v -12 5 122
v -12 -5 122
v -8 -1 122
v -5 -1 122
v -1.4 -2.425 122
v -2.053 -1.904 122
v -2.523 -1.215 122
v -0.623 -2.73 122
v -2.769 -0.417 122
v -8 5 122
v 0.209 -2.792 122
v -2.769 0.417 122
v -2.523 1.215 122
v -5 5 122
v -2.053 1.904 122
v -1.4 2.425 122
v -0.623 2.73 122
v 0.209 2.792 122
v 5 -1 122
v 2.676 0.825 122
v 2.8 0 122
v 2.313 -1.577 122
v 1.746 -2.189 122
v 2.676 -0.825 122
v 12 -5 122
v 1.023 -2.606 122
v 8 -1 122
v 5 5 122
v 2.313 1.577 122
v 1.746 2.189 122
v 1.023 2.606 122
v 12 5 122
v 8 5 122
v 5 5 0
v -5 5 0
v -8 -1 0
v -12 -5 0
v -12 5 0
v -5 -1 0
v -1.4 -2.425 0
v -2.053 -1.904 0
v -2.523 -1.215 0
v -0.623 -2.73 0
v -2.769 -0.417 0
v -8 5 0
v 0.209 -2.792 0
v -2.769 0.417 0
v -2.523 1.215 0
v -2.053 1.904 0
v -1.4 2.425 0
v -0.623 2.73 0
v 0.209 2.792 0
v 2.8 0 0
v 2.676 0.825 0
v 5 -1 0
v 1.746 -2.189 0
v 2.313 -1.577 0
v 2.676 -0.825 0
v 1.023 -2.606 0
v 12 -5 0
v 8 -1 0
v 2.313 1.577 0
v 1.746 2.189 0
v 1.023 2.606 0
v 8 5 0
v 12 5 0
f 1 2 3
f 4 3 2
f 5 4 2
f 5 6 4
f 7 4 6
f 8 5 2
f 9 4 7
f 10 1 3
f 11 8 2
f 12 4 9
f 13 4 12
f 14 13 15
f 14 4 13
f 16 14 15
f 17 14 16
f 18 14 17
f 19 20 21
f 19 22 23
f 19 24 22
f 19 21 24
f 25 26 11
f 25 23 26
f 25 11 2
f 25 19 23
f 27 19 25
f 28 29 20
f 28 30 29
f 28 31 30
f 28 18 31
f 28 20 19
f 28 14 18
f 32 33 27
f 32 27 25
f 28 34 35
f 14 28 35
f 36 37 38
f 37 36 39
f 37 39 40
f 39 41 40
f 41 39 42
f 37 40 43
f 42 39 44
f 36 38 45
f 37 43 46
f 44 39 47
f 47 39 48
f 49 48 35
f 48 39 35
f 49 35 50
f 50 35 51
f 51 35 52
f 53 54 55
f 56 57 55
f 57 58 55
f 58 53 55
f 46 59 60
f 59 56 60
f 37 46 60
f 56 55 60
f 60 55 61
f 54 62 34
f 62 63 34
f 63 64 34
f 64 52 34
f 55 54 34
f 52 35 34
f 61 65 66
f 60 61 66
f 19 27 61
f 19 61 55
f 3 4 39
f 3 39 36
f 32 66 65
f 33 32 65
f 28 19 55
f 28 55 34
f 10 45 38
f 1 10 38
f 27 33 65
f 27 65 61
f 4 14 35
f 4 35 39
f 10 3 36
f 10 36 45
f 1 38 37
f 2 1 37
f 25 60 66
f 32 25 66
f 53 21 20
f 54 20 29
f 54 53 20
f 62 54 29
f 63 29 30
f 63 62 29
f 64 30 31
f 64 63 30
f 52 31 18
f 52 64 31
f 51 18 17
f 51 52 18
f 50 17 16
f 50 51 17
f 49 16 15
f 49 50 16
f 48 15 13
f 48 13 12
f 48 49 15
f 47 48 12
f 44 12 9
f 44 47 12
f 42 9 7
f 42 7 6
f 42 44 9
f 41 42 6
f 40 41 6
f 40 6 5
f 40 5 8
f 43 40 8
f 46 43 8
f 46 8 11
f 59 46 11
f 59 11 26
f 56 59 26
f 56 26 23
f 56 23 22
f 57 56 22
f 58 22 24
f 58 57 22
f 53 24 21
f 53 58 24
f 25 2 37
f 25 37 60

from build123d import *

# Parameters (mm, degrees)
ESQUISSE1_R        = 2.8
BOSS_EXTRU_1_DEPTH = 122


with BuildPart() as part:
    # Esquisse1 → Boss.-Extru.1 (new body)
    with BuildSketch(Plane.XY):
        Polygon((-12, 5), (-12, -5), (12, -5), (12, 5), (8, 5), (8, -1), (5, -1), (5, 5), (-5, 5), (-5, -1), (-8, -1), (-8, 5), align=None)
        Circle(ESQUISSE1_R, mode=Mode.SUBTRACT)
    extrude(amount=BOSS_EXTRU_1_DEPTH)


solid = part.part
